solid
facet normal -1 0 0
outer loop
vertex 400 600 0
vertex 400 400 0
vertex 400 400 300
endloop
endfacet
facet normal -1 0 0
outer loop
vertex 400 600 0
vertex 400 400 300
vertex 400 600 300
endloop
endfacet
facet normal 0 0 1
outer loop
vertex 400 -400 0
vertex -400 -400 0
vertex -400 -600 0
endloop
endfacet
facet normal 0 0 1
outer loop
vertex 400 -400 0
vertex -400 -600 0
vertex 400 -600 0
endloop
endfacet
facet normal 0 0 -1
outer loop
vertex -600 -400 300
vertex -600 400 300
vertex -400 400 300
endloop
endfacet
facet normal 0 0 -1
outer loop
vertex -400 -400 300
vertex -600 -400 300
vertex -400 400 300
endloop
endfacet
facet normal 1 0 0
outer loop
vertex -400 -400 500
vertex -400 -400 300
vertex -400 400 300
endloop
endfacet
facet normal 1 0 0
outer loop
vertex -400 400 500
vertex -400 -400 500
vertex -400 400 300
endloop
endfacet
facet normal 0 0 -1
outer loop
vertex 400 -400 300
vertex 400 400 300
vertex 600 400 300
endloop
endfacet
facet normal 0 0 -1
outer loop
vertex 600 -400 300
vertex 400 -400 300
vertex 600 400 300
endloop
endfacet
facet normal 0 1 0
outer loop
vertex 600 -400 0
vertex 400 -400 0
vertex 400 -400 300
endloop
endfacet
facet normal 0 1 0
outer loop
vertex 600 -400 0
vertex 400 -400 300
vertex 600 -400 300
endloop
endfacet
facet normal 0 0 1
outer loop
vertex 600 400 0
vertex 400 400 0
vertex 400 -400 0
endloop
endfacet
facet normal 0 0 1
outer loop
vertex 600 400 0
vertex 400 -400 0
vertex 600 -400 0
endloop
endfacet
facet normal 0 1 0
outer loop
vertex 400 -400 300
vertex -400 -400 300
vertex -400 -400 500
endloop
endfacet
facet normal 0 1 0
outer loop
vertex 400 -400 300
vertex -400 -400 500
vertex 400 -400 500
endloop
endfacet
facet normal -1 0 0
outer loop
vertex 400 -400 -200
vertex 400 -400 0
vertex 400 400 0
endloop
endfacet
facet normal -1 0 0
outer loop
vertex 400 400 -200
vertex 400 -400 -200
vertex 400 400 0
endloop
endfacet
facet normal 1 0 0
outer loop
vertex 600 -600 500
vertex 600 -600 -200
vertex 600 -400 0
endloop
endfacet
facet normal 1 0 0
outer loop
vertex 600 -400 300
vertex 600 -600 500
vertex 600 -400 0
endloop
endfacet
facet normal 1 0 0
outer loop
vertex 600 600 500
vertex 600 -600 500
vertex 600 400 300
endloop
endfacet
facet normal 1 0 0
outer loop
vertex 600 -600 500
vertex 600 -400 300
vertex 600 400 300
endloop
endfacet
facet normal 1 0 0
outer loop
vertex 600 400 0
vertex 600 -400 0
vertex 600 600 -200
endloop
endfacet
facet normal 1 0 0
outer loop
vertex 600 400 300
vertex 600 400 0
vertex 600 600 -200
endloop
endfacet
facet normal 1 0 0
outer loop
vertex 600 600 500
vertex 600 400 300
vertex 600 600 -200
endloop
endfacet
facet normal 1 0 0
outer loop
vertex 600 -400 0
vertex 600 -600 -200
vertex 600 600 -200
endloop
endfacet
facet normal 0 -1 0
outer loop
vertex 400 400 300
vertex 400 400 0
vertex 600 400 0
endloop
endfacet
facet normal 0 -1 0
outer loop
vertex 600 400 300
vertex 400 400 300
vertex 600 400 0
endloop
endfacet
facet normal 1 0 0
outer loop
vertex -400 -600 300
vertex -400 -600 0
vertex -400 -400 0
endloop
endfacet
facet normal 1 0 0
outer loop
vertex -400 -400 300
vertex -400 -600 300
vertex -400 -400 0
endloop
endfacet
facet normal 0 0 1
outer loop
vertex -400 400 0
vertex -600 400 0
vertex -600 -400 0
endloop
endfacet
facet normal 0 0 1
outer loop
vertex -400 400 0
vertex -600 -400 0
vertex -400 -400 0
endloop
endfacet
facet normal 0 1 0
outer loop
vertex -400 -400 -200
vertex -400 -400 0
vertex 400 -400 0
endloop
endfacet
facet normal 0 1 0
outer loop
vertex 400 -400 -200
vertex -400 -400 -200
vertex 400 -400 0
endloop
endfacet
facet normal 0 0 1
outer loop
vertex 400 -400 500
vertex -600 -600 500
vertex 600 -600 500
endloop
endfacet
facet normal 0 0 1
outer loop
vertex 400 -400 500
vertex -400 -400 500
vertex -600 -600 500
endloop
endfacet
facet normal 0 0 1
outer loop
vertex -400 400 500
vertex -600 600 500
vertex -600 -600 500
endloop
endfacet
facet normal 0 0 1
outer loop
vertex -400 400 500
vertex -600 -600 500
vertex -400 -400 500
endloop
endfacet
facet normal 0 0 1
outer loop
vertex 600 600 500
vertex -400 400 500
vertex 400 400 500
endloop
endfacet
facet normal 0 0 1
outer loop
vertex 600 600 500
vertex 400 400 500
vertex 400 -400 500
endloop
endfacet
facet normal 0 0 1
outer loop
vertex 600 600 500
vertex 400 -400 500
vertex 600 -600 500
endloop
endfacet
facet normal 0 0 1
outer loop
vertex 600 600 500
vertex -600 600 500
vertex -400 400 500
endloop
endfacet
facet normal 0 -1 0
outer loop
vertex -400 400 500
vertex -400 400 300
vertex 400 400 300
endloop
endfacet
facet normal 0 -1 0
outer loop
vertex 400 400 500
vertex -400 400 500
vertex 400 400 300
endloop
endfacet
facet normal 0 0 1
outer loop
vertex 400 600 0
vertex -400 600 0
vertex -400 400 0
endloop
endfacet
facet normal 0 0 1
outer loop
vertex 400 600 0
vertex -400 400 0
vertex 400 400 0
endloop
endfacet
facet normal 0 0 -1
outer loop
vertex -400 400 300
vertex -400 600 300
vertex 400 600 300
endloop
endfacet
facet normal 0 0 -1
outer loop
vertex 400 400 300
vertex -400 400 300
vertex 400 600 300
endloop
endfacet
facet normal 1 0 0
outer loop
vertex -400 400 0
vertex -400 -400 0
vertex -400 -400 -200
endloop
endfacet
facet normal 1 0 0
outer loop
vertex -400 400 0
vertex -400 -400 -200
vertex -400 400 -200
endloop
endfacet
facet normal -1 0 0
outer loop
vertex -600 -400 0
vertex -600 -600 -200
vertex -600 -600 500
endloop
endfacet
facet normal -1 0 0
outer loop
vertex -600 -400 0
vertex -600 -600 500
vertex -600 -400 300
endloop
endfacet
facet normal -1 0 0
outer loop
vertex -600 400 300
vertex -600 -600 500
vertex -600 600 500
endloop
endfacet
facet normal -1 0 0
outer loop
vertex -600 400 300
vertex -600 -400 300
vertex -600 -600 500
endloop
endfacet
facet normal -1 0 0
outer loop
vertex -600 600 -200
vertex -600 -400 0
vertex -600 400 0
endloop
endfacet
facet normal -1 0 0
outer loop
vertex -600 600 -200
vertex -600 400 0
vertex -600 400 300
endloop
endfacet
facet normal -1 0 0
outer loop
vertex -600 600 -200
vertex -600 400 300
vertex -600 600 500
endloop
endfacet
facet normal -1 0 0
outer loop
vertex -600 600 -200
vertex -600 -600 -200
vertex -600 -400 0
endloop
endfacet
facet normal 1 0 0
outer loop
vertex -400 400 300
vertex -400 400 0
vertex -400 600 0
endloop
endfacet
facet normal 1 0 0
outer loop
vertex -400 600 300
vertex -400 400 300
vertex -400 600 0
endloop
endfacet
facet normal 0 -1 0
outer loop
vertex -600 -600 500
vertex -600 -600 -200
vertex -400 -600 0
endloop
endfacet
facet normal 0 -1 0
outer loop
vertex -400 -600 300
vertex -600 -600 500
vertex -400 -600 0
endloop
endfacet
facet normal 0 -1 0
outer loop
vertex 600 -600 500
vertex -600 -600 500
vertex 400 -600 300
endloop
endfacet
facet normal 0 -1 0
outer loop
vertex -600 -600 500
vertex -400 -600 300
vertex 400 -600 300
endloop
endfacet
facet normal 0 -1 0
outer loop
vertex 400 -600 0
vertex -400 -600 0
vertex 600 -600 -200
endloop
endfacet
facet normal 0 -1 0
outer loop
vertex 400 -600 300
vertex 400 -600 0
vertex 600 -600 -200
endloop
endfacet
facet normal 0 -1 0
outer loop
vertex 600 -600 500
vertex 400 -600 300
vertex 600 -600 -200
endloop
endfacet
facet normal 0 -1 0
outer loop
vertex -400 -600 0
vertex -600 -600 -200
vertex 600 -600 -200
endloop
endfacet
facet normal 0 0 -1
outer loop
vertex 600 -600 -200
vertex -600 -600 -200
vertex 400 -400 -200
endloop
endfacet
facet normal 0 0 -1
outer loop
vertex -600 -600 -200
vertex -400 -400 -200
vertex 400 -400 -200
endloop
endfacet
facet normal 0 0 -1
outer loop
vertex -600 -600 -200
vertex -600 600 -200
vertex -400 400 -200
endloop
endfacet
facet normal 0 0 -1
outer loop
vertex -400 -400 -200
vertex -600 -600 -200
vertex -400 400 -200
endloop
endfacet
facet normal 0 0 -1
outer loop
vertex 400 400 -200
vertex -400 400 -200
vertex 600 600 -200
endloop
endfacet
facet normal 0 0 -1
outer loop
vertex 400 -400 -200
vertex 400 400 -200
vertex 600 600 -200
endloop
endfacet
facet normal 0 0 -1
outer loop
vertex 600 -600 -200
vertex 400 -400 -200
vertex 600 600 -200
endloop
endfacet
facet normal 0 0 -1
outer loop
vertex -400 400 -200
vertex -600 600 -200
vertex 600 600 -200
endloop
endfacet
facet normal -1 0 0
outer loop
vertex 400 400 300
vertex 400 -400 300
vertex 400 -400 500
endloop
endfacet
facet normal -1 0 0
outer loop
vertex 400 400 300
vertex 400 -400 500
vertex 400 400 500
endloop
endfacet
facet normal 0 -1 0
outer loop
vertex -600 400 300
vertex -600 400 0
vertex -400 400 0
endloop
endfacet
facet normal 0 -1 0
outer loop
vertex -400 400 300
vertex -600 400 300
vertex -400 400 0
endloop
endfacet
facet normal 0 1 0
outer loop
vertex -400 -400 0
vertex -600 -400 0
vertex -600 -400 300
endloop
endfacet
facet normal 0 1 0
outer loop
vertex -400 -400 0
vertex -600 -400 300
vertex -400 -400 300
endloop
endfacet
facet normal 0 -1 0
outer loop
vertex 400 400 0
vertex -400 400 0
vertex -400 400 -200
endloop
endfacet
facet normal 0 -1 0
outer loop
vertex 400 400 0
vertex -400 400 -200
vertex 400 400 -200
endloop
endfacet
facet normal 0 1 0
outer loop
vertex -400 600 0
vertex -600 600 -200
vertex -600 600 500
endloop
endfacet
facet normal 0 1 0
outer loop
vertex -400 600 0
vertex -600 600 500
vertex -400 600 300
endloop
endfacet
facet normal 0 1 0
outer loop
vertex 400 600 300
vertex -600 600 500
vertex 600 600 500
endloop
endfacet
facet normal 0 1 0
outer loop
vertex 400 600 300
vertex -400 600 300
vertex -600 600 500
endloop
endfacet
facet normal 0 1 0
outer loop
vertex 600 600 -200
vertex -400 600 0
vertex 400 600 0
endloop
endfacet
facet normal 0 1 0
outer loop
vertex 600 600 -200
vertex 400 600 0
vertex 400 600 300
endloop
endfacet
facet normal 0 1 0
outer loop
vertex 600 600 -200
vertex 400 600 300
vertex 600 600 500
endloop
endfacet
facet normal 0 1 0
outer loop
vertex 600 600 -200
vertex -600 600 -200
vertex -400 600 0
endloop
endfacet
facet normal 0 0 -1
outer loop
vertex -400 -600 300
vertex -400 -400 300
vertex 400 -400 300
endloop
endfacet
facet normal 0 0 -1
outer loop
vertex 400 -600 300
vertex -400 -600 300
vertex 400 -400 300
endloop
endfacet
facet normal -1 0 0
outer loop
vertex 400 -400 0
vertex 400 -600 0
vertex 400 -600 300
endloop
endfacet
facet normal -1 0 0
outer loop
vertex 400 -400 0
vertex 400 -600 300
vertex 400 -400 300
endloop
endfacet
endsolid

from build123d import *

# Parameters (mm, degrees)
F0_W     = 200
F0_H     = 200
F0_W_2   = 800
F0_H_2   = 800
F1_DEPTH = 200
F2_DEPTH = 300
F3_DEPTH = 200.001
F4_W     = 1200
F4_H     = 1200
F4_W_2   = 800
F4_H_2   = 800
F5_DEPTH = 200


with BuildPart() as f1:
    # F0 (on Top) → F1 (new body)
    with BuildSketch(Plane.XY):
        with Locations((-500, 500)):
            Rectangle(F0_W, F0_H)
        with Locations((0, 500)):
            Rectangle(F0_W_2, F0_H)
        with Locations((500, 500)):
            Rectangle(F0_W, F0_H)
        with Locations((500, 0)):
            Rectangle(F0_W, F0_H_2)
        Rectangle(F0_W_2, F0_H_2)
        with Locations((-500, 0)):
            Rectangle(F0_W, F0_H_2)
        with Locations((-500, -500)):
            Rectangle(F0_W, F0_H)
        with Locations((0, -500)):
            Rectangle(F0_W_2, F0_H)
        with Locations((500, -500)):
            Rectangle(F0_W, F0_H)
    extrude(amount=-F1_DEPTH)

    # F0 (on Top) → F2 (join)
    with BuildSketch(Plane.XY):
        with Locations((-500, -500)):
            Rectangle(F0_W, F0_H)
        with Locations((500, -500)):
            Rectangle(F0_W, F0_H)
        with Locations((500, 500)):
            Rectangle(F0_W, F0_H)
        with Locations((-500, 500)):
            Rectangle(F0_W, F0_H)
    extrude(amount=F2_DEPTH)

    # F0 (on Top) → F3 (cut, through all)
    with BuildSketch(Plane.XY):
        Rectangle(F0_W_2, F0_H_2)
    extrude(amount=-F3_DEPTH, mode=Mode.SUBTRACT)

    # F4 (on face) → F5 (join)
    with BuildSketch(Plane.XY.offset(300)):
        Rectangle(F4_W, F4_H)
        Rectangle(F4_W_2, F4_H_2, mode=Mode.SUBTRACT)
        Polygon((-600, -600), (600, -600), (600, -400), (600, 600), (-600, 600), align=None)
        Rectangle(F4_W_2, F4_H_2, mode=Mode.SUBTRACT)
    extrude(amount=F5_DEPTH)


solid = f1.part
